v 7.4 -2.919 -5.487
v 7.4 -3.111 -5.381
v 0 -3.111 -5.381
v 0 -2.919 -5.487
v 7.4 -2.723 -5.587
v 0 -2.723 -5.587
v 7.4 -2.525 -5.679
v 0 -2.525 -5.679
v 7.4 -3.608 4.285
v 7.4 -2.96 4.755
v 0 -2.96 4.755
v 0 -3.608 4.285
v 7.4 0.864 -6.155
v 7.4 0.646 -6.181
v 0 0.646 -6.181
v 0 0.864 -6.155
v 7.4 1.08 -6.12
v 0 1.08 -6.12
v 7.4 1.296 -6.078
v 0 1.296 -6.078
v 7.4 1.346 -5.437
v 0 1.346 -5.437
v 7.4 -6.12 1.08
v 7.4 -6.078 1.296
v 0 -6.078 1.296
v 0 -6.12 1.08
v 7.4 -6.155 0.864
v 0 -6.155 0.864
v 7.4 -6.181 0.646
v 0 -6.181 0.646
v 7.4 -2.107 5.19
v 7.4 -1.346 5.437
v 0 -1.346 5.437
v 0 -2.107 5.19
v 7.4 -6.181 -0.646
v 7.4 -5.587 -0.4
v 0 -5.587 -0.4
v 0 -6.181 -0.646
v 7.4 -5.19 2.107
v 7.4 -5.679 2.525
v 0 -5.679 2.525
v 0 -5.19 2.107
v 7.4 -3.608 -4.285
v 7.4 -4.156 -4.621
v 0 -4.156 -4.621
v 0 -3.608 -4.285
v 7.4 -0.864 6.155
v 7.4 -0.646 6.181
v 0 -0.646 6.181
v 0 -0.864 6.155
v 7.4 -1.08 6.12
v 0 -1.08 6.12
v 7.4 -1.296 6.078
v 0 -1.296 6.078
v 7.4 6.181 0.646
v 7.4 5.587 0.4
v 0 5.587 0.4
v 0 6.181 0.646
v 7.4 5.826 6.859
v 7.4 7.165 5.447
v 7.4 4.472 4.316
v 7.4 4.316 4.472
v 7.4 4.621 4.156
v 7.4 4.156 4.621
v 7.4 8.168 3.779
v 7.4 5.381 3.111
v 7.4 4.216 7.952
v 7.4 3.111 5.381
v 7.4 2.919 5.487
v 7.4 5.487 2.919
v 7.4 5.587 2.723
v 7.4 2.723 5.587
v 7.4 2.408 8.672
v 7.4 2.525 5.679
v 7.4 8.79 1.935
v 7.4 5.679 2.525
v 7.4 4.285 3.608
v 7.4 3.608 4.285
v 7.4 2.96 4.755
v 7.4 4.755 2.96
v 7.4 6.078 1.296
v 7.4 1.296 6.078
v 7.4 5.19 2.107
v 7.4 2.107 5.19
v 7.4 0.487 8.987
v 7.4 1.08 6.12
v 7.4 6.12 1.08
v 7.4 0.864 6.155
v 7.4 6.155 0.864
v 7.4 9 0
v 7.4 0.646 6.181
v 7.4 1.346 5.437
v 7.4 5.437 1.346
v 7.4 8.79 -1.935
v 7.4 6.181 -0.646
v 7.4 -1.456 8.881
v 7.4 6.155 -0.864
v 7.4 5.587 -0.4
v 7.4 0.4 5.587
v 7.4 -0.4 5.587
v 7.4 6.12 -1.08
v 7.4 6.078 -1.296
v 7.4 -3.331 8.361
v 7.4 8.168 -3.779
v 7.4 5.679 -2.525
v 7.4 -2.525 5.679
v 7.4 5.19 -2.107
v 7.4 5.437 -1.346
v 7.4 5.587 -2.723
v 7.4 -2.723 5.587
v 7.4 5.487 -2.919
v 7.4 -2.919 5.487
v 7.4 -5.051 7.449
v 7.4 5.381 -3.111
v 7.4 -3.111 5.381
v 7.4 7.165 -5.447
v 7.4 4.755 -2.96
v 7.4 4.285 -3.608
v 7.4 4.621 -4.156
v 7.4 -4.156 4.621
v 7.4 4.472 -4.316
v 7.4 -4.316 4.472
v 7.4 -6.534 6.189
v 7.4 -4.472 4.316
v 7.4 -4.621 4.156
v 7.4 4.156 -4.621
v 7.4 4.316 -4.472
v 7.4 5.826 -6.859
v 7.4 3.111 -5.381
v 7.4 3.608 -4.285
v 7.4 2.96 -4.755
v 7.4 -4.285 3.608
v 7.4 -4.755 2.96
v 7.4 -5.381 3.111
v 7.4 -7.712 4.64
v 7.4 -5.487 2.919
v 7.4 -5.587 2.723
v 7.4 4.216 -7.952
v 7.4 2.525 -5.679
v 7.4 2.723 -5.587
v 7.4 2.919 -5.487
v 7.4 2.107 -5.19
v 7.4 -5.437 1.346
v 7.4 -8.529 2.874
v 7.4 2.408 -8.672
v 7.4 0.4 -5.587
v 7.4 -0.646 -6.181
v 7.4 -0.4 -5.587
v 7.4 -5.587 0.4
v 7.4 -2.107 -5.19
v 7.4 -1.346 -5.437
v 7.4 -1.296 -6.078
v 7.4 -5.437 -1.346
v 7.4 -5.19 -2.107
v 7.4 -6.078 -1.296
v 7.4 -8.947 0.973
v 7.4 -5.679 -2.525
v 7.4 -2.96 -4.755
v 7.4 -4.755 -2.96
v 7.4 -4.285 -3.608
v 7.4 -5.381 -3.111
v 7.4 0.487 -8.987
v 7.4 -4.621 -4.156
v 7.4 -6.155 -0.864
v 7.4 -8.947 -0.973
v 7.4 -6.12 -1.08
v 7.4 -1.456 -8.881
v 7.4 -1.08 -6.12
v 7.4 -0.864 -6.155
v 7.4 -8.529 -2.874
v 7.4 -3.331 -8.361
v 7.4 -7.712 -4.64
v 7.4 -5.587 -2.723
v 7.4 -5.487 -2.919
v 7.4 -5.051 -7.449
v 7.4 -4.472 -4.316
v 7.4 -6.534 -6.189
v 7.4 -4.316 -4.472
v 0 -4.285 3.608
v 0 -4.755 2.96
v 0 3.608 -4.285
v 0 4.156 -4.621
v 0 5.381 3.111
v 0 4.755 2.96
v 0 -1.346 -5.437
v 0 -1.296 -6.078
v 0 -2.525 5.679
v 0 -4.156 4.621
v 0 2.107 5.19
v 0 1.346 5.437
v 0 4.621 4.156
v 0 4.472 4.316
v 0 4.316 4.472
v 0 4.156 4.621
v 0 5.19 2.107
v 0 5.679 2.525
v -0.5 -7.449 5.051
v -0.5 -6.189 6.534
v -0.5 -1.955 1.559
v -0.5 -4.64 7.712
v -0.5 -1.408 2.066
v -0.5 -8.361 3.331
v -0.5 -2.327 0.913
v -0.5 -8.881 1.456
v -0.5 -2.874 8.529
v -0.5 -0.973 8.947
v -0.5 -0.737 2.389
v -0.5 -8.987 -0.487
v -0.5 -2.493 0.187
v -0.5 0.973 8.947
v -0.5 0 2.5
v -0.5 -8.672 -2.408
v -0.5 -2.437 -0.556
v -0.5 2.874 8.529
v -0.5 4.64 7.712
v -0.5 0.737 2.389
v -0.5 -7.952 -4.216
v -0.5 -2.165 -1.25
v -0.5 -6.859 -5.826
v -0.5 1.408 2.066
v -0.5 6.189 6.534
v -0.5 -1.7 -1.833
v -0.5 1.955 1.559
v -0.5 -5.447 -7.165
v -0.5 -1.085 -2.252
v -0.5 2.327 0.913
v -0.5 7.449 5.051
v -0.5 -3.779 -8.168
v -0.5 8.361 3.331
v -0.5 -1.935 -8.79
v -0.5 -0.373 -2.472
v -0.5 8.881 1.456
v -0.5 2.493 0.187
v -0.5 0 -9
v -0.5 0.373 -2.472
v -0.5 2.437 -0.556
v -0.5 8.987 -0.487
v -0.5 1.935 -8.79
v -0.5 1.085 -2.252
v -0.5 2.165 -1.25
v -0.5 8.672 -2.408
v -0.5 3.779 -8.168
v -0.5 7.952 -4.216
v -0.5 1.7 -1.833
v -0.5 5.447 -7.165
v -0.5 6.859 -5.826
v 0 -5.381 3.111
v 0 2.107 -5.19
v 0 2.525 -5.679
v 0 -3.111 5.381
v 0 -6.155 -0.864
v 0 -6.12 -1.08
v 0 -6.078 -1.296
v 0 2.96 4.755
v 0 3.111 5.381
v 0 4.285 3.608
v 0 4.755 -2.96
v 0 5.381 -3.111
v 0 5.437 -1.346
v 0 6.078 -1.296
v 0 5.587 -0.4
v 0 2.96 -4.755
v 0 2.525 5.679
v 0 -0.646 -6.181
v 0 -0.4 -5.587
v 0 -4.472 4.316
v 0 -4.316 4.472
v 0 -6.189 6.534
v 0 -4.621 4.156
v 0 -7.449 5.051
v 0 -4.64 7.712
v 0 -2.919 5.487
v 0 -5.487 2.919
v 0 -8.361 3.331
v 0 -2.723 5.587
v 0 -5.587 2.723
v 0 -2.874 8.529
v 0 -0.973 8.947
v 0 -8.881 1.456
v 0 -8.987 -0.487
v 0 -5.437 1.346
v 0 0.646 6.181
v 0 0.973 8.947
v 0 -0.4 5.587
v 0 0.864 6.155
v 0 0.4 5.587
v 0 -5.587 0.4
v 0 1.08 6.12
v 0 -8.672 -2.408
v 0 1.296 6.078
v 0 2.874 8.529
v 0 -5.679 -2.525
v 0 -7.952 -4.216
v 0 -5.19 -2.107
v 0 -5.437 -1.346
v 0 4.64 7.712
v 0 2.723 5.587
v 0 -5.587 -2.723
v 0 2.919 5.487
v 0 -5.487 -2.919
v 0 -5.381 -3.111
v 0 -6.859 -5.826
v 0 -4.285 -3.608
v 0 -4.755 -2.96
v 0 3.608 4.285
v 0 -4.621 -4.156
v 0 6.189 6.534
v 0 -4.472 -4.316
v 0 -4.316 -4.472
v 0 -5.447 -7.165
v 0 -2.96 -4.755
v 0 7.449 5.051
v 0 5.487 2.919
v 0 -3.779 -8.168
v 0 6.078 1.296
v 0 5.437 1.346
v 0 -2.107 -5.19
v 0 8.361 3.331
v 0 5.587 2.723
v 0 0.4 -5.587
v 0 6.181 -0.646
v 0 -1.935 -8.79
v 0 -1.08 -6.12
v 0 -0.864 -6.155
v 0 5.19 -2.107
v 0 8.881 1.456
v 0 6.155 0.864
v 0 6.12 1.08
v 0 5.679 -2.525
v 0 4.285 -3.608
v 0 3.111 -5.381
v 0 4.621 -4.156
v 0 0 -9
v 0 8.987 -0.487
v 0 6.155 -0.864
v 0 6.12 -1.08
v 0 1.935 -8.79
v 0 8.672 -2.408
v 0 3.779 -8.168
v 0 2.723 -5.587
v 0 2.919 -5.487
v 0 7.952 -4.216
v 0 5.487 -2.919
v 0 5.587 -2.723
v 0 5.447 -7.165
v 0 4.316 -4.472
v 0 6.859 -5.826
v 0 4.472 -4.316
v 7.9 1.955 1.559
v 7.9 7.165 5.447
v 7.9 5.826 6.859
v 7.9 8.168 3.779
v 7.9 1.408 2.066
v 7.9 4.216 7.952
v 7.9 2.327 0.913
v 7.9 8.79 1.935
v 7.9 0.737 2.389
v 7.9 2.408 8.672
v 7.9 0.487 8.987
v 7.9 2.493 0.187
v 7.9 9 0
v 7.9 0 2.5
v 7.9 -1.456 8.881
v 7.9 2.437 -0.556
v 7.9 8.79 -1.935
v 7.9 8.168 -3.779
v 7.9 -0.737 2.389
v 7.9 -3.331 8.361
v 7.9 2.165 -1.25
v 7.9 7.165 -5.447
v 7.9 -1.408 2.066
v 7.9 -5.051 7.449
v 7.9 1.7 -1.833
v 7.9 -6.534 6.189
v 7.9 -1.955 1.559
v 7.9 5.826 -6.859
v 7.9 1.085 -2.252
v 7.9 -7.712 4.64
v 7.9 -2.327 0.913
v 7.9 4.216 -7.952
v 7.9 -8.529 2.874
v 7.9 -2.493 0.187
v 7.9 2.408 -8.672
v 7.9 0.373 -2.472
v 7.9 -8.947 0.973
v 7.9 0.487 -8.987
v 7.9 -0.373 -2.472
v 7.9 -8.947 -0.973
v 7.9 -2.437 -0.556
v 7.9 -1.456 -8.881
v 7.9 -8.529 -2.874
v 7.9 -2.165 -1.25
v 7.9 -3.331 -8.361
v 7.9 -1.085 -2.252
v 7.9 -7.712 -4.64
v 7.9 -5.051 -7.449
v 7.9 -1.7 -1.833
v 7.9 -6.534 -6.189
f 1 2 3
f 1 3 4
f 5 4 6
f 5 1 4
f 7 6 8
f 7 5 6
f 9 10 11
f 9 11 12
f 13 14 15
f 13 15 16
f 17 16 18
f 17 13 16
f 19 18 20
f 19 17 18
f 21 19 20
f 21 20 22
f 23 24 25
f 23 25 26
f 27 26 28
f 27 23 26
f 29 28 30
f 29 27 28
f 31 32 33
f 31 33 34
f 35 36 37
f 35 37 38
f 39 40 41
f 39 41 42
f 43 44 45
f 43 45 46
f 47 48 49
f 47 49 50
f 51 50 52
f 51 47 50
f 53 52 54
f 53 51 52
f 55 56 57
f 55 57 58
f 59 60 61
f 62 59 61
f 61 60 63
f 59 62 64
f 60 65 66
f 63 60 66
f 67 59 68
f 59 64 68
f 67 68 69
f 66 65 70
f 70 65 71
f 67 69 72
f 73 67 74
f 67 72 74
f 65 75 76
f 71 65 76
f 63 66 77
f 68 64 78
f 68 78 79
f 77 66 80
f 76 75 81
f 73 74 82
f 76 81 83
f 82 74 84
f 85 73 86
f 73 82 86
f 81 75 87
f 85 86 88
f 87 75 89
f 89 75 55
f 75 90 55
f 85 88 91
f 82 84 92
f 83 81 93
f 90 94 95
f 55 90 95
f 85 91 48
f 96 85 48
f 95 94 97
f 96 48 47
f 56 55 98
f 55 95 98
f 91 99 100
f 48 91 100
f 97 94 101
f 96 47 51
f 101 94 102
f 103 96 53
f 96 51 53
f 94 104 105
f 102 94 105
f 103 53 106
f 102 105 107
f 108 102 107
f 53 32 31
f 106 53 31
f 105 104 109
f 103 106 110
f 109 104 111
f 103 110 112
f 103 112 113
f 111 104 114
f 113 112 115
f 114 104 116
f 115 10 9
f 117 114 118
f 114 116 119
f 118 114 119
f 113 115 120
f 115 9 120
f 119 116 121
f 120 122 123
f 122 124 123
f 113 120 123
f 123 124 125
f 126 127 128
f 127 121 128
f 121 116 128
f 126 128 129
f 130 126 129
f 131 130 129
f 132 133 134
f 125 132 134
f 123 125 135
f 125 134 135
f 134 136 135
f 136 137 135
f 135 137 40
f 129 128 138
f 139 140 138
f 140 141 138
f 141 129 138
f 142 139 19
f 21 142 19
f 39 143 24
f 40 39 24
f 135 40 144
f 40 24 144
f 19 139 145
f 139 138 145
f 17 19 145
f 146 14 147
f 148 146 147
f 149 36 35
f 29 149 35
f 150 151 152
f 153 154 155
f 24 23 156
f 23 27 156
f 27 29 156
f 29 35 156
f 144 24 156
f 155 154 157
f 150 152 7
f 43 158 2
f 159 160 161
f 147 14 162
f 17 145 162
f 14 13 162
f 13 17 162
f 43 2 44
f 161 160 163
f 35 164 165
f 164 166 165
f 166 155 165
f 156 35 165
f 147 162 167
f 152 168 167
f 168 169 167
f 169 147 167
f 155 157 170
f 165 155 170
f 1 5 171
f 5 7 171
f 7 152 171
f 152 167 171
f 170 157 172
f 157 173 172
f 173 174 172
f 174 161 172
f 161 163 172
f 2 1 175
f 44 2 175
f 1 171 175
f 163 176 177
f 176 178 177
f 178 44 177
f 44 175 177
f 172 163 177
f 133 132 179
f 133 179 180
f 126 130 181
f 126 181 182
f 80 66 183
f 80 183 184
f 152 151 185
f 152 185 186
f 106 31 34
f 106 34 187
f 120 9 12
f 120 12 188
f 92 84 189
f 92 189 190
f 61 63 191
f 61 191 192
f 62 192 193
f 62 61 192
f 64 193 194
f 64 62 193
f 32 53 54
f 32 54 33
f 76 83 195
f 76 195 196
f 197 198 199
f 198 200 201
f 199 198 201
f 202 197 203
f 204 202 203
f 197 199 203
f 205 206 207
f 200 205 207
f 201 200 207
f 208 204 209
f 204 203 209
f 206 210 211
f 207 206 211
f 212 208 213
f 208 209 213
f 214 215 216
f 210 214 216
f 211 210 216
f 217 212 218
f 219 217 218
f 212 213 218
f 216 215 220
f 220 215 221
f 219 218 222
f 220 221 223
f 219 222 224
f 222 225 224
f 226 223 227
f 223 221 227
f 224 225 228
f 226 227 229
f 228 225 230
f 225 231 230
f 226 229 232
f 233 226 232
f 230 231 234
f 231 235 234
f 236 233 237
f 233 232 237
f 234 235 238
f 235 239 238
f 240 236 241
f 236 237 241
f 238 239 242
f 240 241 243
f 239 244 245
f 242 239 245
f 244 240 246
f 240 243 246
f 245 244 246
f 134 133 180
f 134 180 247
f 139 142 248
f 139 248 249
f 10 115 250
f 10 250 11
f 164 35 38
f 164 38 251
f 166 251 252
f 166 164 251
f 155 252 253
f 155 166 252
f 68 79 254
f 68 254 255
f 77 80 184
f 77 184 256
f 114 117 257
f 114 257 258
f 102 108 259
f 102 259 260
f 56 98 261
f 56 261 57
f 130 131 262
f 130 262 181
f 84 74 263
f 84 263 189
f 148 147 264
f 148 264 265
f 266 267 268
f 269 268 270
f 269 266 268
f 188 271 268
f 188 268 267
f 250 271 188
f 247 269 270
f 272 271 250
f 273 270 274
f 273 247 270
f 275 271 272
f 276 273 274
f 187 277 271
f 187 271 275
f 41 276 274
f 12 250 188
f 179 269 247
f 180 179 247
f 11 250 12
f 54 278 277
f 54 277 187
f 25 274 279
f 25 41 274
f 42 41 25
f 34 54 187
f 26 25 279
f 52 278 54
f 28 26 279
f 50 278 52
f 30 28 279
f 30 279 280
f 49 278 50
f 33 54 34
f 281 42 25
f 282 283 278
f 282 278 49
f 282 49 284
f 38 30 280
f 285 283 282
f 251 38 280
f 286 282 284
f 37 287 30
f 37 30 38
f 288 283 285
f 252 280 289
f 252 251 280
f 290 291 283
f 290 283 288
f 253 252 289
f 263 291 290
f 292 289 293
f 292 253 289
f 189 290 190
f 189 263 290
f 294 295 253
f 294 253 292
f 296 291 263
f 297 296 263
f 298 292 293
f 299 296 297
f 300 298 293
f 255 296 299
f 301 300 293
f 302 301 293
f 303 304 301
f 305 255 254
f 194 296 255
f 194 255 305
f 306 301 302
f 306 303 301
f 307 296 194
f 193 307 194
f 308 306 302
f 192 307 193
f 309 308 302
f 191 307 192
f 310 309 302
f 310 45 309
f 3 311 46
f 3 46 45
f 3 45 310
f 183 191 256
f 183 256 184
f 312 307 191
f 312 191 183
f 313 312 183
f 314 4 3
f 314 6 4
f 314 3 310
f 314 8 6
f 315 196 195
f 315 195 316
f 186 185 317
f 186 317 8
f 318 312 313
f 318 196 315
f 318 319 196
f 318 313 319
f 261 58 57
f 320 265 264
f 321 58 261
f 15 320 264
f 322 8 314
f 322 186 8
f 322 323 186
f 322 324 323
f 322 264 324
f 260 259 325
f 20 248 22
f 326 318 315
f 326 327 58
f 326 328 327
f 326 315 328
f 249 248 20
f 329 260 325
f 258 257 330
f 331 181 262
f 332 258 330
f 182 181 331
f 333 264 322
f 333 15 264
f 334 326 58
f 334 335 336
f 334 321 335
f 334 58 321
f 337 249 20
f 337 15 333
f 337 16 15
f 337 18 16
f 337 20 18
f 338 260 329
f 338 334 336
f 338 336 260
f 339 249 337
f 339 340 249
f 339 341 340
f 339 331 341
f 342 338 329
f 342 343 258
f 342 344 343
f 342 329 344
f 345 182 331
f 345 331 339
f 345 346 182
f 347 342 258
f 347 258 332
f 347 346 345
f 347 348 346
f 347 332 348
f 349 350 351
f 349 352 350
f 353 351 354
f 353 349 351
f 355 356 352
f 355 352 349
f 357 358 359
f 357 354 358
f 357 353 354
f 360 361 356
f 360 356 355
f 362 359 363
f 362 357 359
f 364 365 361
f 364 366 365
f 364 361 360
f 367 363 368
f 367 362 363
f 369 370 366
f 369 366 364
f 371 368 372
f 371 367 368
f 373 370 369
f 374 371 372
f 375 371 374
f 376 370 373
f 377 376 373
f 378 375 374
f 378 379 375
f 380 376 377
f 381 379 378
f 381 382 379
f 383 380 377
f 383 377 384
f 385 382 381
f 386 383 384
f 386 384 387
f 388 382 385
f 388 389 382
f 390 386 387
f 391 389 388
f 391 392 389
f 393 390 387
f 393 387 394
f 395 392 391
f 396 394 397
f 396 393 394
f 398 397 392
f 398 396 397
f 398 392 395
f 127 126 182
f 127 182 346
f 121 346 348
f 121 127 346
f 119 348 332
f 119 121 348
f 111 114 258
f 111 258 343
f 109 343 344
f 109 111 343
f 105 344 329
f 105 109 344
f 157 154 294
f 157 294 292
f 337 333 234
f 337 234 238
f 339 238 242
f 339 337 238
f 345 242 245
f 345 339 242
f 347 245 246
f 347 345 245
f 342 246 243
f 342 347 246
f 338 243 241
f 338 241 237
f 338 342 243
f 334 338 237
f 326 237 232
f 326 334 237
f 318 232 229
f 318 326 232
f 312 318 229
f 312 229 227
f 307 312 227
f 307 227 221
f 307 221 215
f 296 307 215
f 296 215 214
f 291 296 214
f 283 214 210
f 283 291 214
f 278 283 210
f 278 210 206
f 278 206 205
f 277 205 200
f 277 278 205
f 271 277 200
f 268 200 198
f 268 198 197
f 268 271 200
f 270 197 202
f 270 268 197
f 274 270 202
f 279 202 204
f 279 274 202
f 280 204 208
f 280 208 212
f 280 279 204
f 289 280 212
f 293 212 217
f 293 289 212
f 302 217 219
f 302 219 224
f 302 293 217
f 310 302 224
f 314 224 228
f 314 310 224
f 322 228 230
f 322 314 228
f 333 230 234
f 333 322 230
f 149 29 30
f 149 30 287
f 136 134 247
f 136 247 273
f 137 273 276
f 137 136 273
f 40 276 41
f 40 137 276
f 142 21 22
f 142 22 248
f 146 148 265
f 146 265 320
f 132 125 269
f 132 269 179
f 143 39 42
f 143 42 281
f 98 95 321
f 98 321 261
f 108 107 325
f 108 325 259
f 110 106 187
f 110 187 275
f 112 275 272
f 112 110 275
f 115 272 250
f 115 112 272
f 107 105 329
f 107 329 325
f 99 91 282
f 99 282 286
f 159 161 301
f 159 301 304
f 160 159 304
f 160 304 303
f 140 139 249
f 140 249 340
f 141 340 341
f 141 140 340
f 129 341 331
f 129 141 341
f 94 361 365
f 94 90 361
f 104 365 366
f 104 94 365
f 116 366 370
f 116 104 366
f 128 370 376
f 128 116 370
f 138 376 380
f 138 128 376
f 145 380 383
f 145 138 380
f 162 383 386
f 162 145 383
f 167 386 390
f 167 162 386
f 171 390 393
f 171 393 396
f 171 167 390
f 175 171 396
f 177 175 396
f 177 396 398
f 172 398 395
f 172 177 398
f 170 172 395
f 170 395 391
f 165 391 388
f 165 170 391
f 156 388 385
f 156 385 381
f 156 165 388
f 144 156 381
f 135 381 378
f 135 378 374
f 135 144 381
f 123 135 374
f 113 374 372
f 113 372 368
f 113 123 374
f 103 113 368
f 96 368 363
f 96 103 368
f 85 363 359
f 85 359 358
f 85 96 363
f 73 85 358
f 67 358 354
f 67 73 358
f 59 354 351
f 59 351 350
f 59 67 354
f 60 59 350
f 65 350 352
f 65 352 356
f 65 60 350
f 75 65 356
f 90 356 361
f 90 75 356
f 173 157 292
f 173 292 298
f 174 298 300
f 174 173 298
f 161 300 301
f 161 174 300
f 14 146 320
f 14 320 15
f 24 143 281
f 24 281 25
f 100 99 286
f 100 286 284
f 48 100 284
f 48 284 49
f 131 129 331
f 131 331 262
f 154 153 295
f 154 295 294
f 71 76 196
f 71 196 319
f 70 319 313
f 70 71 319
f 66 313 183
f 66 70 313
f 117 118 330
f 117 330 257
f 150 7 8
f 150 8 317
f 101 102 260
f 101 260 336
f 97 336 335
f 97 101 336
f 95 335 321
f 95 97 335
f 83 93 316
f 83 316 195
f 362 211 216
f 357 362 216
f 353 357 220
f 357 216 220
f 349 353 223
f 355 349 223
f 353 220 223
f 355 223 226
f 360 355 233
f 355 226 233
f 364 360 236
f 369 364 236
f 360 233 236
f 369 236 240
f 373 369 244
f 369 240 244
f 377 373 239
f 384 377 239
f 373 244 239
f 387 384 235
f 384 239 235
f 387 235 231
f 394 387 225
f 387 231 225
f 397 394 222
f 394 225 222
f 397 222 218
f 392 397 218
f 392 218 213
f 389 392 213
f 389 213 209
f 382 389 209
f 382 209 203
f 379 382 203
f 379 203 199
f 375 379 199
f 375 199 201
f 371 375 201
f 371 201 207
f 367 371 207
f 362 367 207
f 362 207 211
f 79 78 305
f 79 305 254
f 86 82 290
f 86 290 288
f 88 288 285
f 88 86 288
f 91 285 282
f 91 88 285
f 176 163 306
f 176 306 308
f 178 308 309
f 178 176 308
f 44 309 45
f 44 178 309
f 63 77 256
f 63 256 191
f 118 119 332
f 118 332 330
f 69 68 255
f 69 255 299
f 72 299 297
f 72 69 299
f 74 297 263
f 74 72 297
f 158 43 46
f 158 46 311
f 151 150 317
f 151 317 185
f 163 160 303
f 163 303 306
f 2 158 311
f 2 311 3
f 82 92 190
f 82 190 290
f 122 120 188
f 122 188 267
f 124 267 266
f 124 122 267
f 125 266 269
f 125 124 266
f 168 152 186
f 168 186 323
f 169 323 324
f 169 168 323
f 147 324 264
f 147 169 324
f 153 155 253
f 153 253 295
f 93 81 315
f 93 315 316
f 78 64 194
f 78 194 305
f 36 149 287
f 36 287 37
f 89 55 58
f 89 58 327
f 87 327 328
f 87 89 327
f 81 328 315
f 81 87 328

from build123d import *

# Parameters (mm, degrees)
SKETCH1_W                    = 0.5
SKETCH1_H                    = 9
BOSS_EXTRUDE1_DEPTH          = 7.4
SKETCH3_R                    = 9
BOSS_EXTRUDE2_DEPTH          = 0.5
F_5_0_5_DIAMETER_HOLE1_D     = 5
F_5_0_5_DIAMETER_HOLE1_DEPTH = 8.4


with BuildPart() as part:
    # Sketch1 → Revolve1 (revolve)
    with BuildSketch(Plane(origin=(0, 0, 0), x_dir=(-1, 0, 0), z_dir=(0, 0, -1))):
        with Locations((-7.65, 4.5)):
            Rectangle(SKETCH1_W, SKETCH1_H)
    revolve(axis=Axis((7.9, 0, 0), (-1, 0, 0)))

    # Sketch2 → Boss-Extrude1 (add)
    with BuildSketch(Plane.ZY.offset(-7.4)):
        with BuildLine():
            Line((6.078441347, -1.295675803), (5.437383609, -1.346128141))
            Line((5.437383609, -1.346128141), (5.190170014, -2.106973354))
            Line((5.190170014, -2.106973354), (5.679141478, -2.524594437))
            ThreePointArc((5.679141478, -2.524594437), (5.537605548, -2.821550956), (5.38055541, -3.110602591))
            Line((5.38055541, -3.110602591), (4.755282641, -2.96048788))
            Line((4.755282641, -2.96048788), (4.285054439, -3.607701476))
            Line((4.285054439, -3.607701476), (4.621041925, -4.155983221))
            ThreePointArc((4.621041925, -4.155983221), (4.394668645, -4.394668645), (4.155983221, -4.621041925))
            Line((4.155983221, -4.621041925), (3.607701476, -4.285054439))
            Line((3.607701476, -4.285054439), (2.96048788, -4.755282641))
            Line((2.96048788, -4.755282641), (3.110602591, -5.38055541))
            ThreePointArc((3.110602591, -5.38055541), (2.821550956, -5.537605548), (2.524594437, -5.679141478))
            Line((2.524594437, -5.679141478), (2.106973354, -5.190170014))
            Line((2.106973354, -5.190170014), (1.346128141, -5.437383609))
            Line((1.346128141, -5.437383609), (1.295675803, -6.078441347))
            ThreePointArc((1.295675803, -6.078441347), (0.9722402, -6.138483037), (0.64608076, -6.181327095))
            Line((0.64608076, -6.181327095), (0.4, -5.587235585))
            Line((0.4, -5.587235585), (-0.4, -5.587235585))
            Line((-0.4, -5.587235585), (-0.64608076, -6.181327095))
            ThreePointArc((-0.64608076, -6.181327095), (-0.9722402, -6.138483037), (-1.295675803, -6.078441347))
            Line((-1.295675803, -6.078441347), (-1.346128141, -5.437383609))
            Line((-1.346128141, -5.437383609), (-2.106973354, -5.190170014))
            Line((-2.106973354, -5.190170014), (-2.524594437, -5.679141478))
            ThreePointArc((-2.524594437, -5.679141478), (-2.821550956, -5.537605548), (-3.110602591, -5.38055541))
            Line((-3.110602591, -5.38055541), (-2.96048788, -4.755282641))
            Line((-2.96048788, -4.755282641), (-3.607701476, -4.285054439))
            Line((-3.607701476, -4.285054439), (-4.155983221, -4.621041925))
            ThreePointArc((-4.155983221, -4.621041925), (-4.394668645, -4.394668645), (-4.621041925, -4.155983221))
            Line((-4.621041925, -4.155983221), (-4.285054439, -3.607701476))
            Line((-4.285054439, -3.607701476), (-4.755282641, -2.96048788))
            Line((-4.755282641, -2.96048788), (-5.38055541, -3.110602591))
            ThreePointArc((-5.38055541, -3.110602591), (-5.537605548, -2.821550956), (-5.679141478, -2.524594437))
            Line((-5.679141478, -2.524594437), (-5.190170014, -2.106973354))
            Line((-5.190170014, -2.106973354), (-5.437383609, -1.346128141))
            Line((-5.437383609, -1.346128141), (-6.078441347, -1.295675803))
            ThreePointArc((-6.078441347, -1.295675803), (-6.138483037, -0.9722402), (-6.181327095, -0.64608076))
            Line((-6.181327095, -0.64608076), (-5.587235585, -0.4))
            Line((-5.587235585, -0.4), (-5.587235585, 0.4))
            Line((-5.587235585, 0.4), (-6.181327095, 0.64608076))
            ThreePointArc((-6.181327095, 0.64608076), (-6.138483037, 0.9722402), (-6.078441347, 1.295675803))
            Line((-6.078441347, 1.295675803), (-5.437383609, 1.346128141))
            Line((-5.437383609, 1.346128141), (-5.190170014, 2.106973354))
            Line((-5.190170014, 2.106973354), (-5.679141478, 2.524594437))
            ThreePointArc((-5.679141478, 2.524594437), (-5.537605548, 2.821550956), (-5.38055541, 3.110602591))
            Line((-5.38055541, 3.110602591), (-4.755282641, 2.96048788))
            Line((-4.755282641, 2.96048788), (-4.285054439, 3.607701476))
            Line((-4.285054439, 3.607701476), (-4.621041925, 4.155983221))
            ThreePointArc((-4.621041925, 4.155983221), (-4.394668645, 4.394668645), (-4.155983221, 4.621041925))
            Line((-4.155983221, 4.621041925), (-3.607701476, 4.285054439))
            Line((-3.607701476, 4.285054439), (-2.96048788, 4.755282641))
            Line((-2.96048788, 4.755282641), (-3.110602591, 5.38055541))
            ThreePointArc((-3.110602591, 5.38055541), (-2.821550956, 5.537605548), (-2.524594437, 5.679141478))
            Line((-2.524594437, 5.679141478), (-2.106973354, 5.190170014))
            Line((-2.106973354, 5.190170014), (-1.346128141, 5.437383609))
            Line((-1.346128141, 5.437383609), (-1.295675803, 6.078441347))
            ThreePointArc((-1.295675803, 6.078441347), (-0.9722402, 6.138483037), (-0.64608076, 6.181327095))
            Line((-0.64608076, 6.181327095), (-0.4, 5.587235585))
            Line((-0.4, 5.587235585), (0.4, 5.587235585))
            Line((0.4, 5.587235585), (0.64608076, 6.181327095))
            ThreePointArc((0.64608076, 6.181327095), (0.9722402, 6.138483037), (1.295675803, 6.078441347))
            Line((1.295675803, 6.078441347), (1.346128141, 5.437383609))
            Line((1.346128141, 5.437383609), (2.106973354, 5.190170014))
            Line((2.106973354, 5.190170014), (2.524594437, 5.679141478))
            ThreePointArc((2.524594437, 5.679141478), (2.821550956, 5.537605548), (3.110602591, 5.38055541))
            Line((3.110602591, 5.38055541), (2.96048788, 4.755282641))
            Line((2.96048788, 4.755282641), (3.607701476, 4.285054439))
            Line((3.607701476, 4.285054439), (4.155983221, 4.621041925))
            ThreePointArc((4.155983221, 4.621041925), (4.394668645, 4.394668645), (4.621041925, 4.155983221))
            Line((4.621041925, 4.155983221), (4.285054439, 3.607701476))
            Line((4.285054439, 3.607701476), (4.755282641, 2.96048788))
            Line((4.755282641, 2.96048788), (5.38055541, 3.110602591))
            ThreePointArc((5.38055541, 3.110602591), (5.537605548, 2.821550956), (5.679141478, 2.524594437))
            Line((5.679141478, 2.524594437), (5.190170014, 2.106973354))
            Line((5.190170014, 2.106973354), (5.437383609, 1.346128141))
            Line((5.437383609, 1.346128141), (6.078441347, 1.295675803))
            ThreePointArc((6.078441347, 1.295675803), (6.138483037, 0.9722402), (6.181327095, 0.64608076))
            Line((6.181327095, 0.64608076), (5.587235585, 0.4))
            Line((5.587235585, 0.4), (5.587235585, -0.4))
            Line((5.587235585, -0.4), (6.181327095, -0.64608076))
            ThreePointArc((6.181327095, -0.64608076), (6.138483037, -0.9722402), (6.078441347, -1.295675803))
        make_face()
    extrude(amount=BOSS_EXTRUDE1_DEPTH)

    # Sketch3 → Boss-Extrude2 (add)
    with BuildSketch(Plane(origin=(0, 0, 0), x_dir=(0, 0, -1), z_dir=(1, 0, 0))):
        Circle(SKETCH3_R)
    extrude(amount=-BOSS_EXTRUDE2_DEPTH)

    # Ø5.0 (5) Diameter Hole1
    with Locations(Plane(origin=(7.9, 0, 0), x_dir=(0, 0, -1), z_dir=(1, 0, 0))):
        with Locations((0, 0)):
            Hole(F_5_0_5_DIAMETER_HOLE1_D / 2, depth=F_5_0_5_DIAMETER_HOLE1_DEPTH)


solid = part.part
